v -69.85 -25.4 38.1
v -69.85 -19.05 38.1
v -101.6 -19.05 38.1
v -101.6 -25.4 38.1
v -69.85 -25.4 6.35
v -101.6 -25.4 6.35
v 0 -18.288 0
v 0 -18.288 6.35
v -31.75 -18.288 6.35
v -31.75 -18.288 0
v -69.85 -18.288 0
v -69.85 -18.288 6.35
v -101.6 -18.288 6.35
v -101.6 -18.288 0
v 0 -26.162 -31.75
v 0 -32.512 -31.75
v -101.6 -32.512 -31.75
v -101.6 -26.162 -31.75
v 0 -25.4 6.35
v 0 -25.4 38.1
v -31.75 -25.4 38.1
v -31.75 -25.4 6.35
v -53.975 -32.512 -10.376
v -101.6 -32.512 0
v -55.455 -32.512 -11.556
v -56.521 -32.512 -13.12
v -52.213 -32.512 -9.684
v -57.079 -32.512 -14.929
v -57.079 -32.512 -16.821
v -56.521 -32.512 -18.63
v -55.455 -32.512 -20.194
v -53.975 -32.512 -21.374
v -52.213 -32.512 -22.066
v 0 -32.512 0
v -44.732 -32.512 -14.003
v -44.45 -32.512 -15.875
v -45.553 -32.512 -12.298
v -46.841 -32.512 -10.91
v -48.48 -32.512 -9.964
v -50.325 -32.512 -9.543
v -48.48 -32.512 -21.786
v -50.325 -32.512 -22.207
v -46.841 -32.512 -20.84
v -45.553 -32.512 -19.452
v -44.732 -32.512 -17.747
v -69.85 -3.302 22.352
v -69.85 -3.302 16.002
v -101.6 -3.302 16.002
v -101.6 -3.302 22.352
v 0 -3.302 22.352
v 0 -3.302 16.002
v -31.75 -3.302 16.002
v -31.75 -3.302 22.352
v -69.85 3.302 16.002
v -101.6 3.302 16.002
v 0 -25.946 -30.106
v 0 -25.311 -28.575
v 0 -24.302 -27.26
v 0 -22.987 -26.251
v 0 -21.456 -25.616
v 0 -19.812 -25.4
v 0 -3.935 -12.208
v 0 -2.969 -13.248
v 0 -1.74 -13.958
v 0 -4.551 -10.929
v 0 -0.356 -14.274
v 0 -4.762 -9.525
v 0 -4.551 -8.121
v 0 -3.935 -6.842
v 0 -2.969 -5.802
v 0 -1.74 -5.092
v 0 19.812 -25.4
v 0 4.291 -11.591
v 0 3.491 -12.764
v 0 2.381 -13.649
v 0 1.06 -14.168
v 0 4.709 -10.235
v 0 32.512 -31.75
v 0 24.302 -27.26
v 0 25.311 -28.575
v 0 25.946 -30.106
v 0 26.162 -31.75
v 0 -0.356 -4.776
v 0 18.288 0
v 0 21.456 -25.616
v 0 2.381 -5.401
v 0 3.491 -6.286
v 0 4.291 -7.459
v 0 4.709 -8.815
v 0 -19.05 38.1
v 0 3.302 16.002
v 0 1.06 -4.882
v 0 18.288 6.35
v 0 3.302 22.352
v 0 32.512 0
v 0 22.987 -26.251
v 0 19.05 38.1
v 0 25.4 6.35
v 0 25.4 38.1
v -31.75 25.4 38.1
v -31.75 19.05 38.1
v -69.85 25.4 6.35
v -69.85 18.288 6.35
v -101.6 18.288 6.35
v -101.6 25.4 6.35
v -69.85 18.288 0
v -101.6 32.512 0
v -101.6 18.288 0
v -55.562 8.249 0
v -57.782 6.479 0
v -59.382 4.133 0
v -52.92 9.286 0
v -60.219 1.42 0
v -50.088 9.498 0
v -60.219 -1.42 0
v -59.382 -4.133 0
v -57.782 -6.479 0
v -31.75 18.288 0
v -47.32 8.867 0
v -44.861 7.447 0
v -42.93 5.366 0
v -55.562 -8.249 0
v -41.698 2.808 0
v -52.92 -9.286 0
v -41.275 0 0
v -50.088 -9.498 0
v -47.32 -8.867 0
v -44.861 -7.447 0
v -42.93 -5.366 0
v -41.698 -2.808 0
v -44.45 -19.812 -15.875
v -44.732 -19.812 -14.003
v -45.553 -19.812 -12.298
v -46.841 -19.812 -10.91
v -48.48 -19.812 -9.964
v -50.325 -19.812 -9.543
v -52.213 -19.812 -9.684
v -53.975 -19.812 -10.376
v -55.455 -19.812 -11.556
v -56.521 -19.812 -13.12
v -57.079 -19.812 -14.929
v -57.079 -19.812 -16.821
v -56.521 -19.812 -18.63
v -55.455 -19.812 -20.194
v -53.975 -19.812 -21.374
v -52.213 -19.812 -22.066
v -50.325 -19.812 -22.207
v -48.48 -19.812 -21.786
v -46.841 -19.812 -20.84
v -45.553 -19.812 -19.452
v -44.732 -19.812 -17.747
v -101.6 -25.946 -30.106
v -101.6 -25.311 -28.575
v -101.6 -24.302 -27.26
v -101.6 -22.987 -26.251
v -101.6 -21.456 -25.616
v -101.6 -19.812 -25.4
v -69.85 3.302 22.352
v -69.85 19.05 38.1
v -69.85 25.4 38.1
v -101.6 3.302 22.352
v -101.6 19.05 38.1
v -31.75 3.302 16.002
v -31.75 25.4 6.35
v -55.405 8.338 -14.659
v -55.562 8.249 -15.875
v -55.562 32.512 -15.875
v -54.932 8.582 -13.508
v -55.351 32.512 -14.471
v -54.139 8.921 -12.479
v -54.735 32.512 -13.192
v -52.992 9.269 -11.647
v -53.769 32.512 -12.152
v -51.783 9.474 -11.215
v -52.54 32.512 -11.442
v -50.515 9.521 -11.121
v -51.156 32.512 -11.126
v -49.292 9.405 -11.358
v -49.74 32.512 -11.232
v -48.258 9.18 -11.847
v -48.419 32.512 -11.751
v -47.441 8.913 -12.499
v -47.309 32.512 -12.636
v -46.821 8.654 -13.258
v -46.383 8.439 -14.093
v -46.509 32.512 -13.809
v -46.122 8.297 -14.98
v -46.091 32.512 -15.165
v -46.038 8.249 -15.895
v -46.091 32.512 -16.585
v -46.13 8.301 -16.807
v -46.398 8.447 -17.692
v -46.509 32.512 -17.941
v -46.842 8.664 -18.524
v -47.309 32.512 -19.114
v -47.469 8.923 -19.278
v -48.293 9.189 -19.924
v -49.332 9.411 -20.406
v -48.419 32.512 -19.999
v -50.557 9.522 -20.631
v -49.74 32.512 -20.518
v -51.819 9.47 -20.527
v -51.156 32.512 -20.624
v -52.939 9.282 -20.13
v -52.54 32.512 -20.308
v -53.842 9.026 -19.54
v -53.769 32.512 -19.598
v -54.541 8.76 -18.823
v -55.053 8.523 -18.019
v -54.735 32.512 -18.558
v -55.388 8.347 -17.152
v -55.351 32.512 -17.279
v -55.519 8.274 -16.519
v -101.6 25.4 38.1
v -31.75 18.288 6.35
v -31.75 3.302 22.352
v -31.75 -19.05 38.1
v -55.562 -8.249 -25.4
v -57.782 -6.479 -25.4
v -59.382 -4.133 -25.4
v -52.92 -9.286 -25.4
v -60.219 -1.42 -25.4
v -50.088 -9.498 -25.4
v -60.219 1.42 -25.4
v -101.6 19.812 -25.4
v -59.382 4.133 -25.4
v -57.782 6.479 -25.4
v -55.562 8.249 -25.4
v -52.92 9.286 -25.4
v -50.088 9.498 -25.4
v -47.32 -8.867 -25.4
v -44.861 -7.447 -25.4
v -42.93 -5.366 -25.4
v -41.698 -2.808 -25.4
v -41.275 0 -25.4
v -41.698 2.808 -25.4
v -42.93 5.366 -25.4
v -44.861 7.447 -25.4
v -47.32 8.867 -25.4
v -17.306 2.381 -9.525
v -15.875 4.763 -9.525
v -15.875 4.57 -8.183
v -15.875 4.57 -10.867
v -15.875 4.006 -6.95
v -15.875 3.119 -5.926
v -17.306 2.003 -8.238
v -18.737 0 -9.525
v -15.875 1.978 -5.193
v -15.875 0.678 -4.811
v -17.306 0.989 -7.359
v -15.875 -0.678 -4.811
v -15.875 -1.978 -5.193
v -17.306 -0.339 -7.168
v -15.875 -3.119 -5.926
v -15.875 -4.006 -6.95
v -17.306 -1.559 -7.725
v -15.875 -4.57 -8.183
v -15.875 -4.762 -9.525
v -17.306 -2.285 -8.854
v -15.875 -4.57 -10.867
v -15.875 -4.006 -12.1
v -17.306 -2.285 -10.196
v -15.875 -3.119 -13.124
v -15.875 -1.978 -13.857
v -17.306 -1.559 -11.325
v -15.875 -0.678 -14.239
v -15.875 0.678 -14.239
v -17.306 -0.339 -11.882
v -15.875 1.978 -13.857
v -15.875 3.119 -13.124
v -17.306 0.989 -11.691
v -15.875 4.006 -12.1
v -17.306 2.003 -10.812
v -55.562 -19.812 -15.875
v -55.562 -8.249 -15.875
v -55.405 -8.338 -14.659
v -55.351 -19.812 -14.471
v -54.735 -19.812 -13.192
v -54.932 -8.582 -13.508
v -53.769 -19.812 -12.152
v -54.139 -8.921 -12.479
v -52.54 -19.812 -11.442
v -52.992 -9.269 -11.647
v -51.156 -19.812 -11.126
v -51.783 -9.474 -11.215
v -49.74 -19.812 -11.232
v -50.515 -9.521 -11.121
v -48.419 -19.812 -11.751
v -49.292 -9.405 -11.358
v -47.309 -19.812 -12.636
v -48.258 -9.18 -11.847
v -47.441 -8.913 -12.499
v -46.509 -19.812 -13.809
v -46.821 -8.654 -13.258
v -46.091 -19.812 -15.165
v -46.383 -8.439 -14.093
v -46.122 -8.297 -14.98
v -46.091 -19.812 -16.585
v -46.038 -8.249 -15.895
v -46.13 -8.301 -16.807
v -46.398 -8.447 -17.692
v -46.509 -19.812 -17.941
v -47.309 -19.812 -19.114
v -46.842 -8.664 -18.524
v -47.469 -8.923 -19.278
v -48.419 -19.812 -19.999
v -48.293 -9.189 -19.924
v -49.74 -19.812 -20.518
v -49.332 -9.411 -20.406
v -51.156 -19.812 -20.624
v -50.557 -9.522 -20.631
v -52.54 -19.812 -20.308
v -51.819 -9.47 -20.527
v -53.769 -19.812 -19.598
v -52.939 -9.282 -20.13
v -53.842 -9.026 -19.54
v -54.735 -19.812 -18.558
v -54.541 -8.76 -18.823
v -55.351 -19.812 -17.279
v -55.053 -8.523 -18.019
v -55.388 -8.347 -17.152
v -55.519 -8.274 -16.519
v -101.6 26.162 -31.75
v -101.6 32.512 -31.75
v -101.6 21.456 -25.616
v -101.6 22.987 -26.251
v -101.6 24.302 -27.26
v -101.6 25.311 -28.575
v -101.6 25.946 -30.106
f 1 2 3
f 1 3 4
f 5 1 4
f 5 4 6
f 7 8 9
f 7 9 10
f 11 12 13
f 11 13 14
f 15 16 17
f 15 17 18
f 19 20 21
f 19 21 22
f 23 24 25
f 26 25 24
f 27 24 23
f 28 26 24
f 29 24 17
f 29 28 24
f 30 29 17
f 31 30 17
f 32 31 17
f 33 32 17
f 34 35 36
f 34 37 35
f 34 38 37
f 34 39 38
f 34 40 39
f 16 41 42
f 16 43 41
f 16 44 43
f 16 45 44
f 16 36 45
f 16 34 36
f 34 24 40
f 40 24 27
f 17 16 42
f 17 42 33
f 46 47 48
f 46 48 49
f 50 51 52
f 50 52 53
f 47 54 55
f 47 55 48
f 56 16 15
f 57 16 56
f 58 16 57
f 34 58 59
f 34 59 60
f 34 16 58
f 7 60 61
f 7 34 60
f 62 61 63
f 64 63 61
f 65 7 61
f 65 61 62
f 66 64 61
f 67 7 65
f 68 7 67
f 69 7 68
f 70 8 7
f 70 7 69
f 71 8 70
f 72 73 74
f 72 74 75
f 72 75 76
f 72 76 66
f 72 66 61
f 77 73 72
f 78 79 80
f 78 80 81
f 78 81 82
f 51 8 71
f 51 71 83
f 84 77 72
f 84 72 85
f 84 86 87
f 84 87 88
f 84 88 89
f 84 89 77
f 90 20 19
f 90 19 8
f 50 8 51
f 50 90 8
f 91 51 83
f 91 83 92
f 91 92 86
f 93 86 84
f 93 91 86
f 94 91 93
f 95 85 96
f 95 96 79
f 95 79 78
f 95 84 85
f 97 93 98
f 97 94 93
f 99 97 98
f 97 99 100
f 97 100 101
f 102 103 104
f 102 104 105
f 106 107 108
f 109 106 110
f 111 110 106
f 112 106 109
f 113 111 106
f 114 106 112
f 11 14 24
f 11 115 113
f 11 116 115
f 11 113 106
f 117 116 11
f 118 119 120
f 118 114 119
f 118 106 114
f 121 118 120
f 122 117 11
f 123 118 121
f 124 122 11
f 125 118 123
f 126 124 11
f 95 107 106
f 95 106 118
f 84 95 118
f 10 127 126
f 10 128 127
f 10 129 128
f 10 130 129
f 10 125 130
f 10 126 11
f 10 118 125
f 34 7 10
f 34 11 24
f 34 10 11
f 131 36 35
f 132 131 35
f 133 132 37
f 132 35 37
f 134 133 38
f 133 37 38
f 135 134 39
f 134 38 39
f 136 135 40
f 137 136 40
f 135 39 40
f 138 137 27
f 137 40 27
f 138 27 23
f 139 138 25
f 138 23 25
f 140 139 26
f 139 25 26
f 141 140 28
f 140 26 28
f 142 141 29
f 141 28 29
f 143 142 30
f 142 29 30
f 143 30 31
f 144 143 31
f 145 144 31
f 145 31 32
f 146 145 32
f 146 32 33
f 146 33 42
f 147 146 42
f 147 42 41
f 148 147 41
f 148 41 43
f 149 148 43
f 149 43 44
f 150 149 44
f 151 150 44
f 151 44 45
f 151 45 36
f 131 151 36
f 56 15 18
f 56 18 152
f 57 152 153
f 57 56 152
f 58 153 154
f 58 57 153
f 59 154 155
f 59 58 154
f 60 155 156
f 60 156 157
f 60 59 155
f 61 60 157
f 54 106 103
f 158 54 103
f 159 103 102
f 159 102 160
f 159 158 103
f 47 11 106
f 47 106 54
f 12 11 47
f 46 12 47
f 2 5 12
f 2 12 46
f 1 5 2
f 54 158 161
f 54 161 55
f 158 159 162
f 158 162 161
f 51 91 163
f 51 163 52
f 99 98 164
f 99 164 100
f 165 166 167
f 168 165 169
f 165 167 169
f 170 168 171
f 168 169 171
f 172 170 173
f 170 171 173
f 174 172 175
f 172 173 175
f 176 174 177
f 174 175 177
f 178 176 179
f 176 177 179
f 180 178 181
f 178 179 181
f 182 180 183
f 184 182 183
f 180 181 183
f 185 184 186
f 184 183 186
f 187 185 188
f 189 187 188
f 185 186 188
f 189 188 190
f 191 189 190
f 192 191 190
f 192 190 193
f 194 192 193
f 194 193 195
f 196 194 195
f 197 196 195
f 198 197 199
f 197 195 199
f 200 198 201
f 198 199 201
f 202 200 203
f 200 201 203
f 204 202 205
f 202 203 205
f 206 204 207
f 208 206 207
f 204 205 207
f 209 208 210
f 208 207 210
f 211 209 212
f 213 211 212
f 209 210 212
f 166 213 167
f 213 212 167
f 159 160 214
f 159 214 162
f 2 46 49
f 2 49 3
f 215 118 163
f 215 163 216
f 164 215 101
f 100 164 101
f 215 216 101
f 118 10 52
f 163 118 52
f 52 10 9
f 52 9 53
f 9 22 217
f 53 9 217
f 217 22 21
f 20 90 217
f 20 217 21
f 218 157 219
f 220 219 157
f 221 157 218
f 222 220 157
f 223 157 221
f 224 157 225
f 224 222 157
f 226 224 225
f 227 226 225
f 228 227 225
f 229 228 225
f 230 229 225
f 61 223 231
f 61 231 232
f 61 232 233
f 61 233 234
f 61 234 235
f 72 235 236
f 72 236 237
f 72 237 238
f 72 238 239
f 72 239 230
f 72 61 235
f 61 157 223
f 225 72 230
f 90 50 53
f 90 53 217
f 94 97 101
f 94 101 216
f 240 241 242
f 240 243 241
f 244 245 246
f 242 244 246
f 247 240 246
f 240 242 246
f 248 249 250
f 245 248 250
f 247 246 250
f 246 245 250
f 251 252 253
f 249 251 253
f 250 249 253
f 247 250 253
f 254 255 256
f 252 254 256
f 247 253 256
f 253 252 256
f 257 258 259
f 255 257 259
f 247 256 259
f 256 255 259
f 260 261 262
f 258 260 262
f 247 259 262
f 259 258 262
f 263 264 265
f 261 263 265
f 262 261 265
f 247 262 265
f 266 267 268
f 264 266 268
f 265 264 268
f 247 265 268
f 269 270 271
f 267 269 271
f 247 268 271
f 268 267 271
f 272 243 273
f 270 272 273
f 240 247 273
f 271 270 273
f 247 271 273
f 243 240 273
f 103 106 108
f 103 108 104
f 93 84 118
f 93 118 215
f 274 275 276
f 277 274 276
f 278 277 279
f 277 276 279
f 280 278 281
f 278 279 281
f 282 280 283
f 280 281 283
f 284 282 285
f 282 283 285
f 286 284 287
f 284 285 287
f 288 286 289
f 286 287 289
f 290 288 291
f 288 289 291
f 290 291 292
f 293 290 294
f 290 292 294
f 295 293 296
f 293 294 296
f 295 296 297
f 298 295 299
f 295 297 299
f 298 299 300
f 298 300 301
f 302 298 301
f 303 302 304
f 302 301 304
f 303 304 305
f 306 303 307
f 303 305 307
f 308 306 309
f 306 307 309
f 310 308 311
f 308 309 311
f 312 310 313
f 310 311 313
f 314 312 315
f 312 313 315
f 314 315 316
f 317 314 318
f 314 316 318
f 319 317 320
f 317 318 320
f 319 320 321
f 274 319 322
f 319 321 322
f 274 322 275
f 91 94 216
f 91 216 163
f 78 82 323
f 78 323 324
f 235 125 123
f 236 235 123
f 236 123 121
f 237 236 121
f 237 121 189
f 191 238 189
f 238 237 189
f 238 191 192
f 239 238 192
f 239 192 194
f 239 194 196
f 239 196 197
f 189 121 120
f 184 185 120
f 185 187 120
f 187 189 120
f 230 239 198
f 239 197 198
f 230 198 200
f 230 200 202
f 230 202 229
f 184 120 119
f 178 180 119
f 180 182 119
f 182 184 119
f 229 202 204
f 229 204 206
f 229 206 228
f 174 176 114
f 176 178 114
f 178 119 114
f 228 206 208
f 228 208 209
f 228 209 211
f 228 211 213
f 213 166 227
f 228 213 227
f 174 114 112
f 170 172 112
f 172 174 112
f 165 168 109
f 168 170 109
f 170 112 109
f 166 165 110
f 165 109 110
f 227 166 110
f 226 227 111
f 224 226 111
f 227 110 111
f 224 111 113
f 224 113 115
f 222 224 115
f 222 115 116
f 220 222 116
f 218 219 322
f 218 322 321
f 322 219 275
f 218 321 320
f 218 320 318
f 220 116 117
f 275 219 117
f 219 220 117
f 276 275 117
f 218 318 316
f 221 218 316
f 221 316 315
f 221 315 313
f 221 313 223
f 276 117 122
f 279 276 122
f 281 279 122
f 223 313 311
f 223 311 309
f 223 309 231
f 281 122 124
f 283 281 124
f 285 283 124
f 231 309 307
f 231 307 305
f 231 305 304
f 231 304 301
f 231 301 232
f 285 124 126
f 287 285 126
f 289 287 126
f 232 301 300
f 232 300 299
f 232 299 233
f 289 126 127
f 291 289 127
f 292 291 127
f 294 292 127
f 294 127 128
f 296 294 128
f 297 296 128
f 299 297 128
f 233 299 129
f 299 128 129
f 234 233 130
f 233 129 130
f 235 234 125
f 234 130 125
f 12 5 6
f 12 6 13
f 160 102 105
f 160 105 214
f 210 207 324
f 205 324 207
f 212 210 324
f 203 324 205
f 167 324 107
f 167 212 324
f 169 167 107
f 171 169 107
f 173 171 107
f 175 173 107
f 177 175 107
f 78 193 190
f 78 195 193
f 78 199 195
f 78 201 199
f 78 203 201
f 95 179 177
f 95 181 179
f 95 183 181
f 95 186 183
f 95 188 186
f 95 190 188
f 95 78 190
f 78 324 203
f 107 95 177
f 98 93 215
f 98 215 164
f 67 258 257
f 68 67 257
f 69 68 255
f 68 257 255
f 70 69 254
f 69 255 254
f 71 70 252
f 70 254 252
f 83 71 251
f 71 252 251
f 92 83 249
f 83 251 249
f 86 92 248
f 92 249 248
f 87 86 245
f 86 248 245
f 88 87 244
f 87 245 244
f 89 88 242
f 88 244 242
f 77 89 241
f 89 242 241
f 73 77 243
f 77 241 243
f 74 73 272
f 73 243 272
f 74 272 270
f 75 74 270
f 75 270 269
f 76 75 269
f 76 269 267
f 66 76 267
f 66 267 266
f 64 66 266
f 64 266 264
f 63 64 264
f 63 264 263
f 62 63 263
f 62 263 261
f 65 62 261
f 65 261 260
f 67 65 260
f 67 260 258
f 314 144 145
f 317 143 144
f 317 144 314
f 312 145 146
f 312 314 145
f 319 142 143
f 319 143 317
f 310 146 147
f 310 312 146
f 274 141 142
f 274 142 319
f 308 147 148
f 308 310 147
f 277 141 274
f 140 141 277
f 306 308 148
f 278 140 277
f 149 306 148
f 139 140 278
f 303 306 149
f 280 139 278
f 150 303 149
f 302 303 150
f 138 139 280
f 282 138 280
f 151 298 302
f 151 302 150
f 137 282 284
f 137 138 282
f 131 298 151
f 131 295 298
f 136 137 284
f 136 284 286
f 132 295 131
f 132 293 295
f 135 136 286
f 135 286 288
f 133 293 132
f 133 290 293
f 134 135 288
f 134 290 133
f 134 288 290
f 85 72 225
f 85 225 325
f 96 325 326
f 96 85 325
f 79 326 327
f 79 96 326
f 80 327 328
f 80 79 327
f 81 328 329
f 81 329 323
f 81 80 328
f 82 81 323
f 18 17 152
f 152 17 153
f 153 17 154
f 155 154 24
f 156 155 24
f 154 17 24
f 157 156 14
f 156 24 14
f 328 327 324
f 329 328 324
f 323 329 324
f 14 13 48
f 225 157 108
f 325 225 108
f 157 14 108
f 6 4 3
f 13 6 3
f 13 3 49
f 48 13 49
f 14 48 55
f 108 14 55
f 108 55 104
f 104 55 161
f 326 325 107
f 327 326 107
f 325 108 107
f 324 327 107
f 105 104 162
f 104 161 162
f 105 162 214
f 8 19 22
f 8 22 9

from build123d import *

# Parameters (mm, degrees)
F1_DEPTH       = 101.6
F3_D           = 9.525
F3_DEPTH       = 15.875
F3_CBORE_D     = 9.525
F3_CBORE_DEPTH = 9.525
F3_TIP         = 2.8615986981
F5_D           = 9.525
F5_CBORE_D     = 12.7
F5_CBORE_DEPTH = 12.7
F6_W           = 38.1
F6_H           = 38.1
F7_DEPTH       = 57.913
F8_R           = 9.525
F9_DEPTH       = 31.751


with BuildPart() as f1:
    # F0 (on Right) → F1 (new body)
    with BuildSketch(Plane.YZ):
        with BuildLine():
            Line((-18.288, 0), (-32.512, 0))
            Line((-32.512, 0), (-32.512, -31.75))
            Line((-32.512, -31.75), (-26.162, -31.75))
            ThreePointArc((-26.162, -31.75), (-24.3021280605, -27.2598719395), (-19.812, -25.4))
            Line((-19.812, -25.4), (19.812, -25.4))
            ThreePointArc((19.812, -25.4), (24.3021280605, -27.2598719395), (26.162, -31.75))
            Line((26.162, -31.75), (32.512, -31.75))
            Line((32.512, -31.75), (32.512, 0))
            Line((32.512, 0), (18.288, 0))
            Line((18.288, 0), (18.288, 6.35))
            Line((18.288, 6.35), (25.4, 6.35))
            Line((25.4, 6.35), (25.4, 38.1))
            Line((25.4, 38.1), (19.05, 38.1))
            Line((19.05, 38.1), (3.302, 22.352))
            Line((3.302, 22.352), (3.302, 16.002))
            Line((3.302, 16.002), (-3.302, 16.002))
            Line((-3.302, 16.002), (-3.302, 22.352))
            Line((-3.302, 22.352), (-19.05, 38.1))
            Line((-19.05, 38.1), (-25.4, 38.1))
            Line((-25.4, 38.1), (-25.4, 6.35))
            Line((-25.4, 6.35), (-18.288, 6.35))
            Line((-18.288, 6.35), (-18.288, 0))
        make_face()
    extrude(amount=-F1_DEPTH)

    # F3
    with Locations(Plane.YZ):
        with Locations((0, -9.525)):
            CounterBoreHole(F3_D / 2, F3_CBORE_D / 2, F3_CBORE_DEPTH, depth=F3_DEPTH)
            with Locations((0, 0, -(F3_DEPTH + F3_TIP / 2))):  # 118° drill point
                Cone(0, F3_D / 2, F3_TIP, mode=Mode.SUBTRACT)

    # F5 (through all)
    with Locations(Plane.XZ.offset(32.512)):
        with Locations((-50.8, -15.875)):
            CounterBoreHole(F5_D / 2, F5_CBORE_D / 2, F5_CBORE_DEPTH)

    # F6 (on face) → F7 (cut, through all)
    with BuildSketch(Plane.XZ.offset(25.4)):
        with Locations((-50.8, 19.05)):
            Rectangle(F6_W, F6_H)
    extrude(amount=-F7_DEPTH, mode=Mode.SUBTRACT)

    # F8 (on face) → F9 (cut, through all)
    with BuildSketch(Plane.XY):
        with Locations((-50.8, 0)):
            Circle(F8_R)
    extrude(amount=-F9_DEPTH, mode=Mode.SUBTRACT)


solid = f1.part
